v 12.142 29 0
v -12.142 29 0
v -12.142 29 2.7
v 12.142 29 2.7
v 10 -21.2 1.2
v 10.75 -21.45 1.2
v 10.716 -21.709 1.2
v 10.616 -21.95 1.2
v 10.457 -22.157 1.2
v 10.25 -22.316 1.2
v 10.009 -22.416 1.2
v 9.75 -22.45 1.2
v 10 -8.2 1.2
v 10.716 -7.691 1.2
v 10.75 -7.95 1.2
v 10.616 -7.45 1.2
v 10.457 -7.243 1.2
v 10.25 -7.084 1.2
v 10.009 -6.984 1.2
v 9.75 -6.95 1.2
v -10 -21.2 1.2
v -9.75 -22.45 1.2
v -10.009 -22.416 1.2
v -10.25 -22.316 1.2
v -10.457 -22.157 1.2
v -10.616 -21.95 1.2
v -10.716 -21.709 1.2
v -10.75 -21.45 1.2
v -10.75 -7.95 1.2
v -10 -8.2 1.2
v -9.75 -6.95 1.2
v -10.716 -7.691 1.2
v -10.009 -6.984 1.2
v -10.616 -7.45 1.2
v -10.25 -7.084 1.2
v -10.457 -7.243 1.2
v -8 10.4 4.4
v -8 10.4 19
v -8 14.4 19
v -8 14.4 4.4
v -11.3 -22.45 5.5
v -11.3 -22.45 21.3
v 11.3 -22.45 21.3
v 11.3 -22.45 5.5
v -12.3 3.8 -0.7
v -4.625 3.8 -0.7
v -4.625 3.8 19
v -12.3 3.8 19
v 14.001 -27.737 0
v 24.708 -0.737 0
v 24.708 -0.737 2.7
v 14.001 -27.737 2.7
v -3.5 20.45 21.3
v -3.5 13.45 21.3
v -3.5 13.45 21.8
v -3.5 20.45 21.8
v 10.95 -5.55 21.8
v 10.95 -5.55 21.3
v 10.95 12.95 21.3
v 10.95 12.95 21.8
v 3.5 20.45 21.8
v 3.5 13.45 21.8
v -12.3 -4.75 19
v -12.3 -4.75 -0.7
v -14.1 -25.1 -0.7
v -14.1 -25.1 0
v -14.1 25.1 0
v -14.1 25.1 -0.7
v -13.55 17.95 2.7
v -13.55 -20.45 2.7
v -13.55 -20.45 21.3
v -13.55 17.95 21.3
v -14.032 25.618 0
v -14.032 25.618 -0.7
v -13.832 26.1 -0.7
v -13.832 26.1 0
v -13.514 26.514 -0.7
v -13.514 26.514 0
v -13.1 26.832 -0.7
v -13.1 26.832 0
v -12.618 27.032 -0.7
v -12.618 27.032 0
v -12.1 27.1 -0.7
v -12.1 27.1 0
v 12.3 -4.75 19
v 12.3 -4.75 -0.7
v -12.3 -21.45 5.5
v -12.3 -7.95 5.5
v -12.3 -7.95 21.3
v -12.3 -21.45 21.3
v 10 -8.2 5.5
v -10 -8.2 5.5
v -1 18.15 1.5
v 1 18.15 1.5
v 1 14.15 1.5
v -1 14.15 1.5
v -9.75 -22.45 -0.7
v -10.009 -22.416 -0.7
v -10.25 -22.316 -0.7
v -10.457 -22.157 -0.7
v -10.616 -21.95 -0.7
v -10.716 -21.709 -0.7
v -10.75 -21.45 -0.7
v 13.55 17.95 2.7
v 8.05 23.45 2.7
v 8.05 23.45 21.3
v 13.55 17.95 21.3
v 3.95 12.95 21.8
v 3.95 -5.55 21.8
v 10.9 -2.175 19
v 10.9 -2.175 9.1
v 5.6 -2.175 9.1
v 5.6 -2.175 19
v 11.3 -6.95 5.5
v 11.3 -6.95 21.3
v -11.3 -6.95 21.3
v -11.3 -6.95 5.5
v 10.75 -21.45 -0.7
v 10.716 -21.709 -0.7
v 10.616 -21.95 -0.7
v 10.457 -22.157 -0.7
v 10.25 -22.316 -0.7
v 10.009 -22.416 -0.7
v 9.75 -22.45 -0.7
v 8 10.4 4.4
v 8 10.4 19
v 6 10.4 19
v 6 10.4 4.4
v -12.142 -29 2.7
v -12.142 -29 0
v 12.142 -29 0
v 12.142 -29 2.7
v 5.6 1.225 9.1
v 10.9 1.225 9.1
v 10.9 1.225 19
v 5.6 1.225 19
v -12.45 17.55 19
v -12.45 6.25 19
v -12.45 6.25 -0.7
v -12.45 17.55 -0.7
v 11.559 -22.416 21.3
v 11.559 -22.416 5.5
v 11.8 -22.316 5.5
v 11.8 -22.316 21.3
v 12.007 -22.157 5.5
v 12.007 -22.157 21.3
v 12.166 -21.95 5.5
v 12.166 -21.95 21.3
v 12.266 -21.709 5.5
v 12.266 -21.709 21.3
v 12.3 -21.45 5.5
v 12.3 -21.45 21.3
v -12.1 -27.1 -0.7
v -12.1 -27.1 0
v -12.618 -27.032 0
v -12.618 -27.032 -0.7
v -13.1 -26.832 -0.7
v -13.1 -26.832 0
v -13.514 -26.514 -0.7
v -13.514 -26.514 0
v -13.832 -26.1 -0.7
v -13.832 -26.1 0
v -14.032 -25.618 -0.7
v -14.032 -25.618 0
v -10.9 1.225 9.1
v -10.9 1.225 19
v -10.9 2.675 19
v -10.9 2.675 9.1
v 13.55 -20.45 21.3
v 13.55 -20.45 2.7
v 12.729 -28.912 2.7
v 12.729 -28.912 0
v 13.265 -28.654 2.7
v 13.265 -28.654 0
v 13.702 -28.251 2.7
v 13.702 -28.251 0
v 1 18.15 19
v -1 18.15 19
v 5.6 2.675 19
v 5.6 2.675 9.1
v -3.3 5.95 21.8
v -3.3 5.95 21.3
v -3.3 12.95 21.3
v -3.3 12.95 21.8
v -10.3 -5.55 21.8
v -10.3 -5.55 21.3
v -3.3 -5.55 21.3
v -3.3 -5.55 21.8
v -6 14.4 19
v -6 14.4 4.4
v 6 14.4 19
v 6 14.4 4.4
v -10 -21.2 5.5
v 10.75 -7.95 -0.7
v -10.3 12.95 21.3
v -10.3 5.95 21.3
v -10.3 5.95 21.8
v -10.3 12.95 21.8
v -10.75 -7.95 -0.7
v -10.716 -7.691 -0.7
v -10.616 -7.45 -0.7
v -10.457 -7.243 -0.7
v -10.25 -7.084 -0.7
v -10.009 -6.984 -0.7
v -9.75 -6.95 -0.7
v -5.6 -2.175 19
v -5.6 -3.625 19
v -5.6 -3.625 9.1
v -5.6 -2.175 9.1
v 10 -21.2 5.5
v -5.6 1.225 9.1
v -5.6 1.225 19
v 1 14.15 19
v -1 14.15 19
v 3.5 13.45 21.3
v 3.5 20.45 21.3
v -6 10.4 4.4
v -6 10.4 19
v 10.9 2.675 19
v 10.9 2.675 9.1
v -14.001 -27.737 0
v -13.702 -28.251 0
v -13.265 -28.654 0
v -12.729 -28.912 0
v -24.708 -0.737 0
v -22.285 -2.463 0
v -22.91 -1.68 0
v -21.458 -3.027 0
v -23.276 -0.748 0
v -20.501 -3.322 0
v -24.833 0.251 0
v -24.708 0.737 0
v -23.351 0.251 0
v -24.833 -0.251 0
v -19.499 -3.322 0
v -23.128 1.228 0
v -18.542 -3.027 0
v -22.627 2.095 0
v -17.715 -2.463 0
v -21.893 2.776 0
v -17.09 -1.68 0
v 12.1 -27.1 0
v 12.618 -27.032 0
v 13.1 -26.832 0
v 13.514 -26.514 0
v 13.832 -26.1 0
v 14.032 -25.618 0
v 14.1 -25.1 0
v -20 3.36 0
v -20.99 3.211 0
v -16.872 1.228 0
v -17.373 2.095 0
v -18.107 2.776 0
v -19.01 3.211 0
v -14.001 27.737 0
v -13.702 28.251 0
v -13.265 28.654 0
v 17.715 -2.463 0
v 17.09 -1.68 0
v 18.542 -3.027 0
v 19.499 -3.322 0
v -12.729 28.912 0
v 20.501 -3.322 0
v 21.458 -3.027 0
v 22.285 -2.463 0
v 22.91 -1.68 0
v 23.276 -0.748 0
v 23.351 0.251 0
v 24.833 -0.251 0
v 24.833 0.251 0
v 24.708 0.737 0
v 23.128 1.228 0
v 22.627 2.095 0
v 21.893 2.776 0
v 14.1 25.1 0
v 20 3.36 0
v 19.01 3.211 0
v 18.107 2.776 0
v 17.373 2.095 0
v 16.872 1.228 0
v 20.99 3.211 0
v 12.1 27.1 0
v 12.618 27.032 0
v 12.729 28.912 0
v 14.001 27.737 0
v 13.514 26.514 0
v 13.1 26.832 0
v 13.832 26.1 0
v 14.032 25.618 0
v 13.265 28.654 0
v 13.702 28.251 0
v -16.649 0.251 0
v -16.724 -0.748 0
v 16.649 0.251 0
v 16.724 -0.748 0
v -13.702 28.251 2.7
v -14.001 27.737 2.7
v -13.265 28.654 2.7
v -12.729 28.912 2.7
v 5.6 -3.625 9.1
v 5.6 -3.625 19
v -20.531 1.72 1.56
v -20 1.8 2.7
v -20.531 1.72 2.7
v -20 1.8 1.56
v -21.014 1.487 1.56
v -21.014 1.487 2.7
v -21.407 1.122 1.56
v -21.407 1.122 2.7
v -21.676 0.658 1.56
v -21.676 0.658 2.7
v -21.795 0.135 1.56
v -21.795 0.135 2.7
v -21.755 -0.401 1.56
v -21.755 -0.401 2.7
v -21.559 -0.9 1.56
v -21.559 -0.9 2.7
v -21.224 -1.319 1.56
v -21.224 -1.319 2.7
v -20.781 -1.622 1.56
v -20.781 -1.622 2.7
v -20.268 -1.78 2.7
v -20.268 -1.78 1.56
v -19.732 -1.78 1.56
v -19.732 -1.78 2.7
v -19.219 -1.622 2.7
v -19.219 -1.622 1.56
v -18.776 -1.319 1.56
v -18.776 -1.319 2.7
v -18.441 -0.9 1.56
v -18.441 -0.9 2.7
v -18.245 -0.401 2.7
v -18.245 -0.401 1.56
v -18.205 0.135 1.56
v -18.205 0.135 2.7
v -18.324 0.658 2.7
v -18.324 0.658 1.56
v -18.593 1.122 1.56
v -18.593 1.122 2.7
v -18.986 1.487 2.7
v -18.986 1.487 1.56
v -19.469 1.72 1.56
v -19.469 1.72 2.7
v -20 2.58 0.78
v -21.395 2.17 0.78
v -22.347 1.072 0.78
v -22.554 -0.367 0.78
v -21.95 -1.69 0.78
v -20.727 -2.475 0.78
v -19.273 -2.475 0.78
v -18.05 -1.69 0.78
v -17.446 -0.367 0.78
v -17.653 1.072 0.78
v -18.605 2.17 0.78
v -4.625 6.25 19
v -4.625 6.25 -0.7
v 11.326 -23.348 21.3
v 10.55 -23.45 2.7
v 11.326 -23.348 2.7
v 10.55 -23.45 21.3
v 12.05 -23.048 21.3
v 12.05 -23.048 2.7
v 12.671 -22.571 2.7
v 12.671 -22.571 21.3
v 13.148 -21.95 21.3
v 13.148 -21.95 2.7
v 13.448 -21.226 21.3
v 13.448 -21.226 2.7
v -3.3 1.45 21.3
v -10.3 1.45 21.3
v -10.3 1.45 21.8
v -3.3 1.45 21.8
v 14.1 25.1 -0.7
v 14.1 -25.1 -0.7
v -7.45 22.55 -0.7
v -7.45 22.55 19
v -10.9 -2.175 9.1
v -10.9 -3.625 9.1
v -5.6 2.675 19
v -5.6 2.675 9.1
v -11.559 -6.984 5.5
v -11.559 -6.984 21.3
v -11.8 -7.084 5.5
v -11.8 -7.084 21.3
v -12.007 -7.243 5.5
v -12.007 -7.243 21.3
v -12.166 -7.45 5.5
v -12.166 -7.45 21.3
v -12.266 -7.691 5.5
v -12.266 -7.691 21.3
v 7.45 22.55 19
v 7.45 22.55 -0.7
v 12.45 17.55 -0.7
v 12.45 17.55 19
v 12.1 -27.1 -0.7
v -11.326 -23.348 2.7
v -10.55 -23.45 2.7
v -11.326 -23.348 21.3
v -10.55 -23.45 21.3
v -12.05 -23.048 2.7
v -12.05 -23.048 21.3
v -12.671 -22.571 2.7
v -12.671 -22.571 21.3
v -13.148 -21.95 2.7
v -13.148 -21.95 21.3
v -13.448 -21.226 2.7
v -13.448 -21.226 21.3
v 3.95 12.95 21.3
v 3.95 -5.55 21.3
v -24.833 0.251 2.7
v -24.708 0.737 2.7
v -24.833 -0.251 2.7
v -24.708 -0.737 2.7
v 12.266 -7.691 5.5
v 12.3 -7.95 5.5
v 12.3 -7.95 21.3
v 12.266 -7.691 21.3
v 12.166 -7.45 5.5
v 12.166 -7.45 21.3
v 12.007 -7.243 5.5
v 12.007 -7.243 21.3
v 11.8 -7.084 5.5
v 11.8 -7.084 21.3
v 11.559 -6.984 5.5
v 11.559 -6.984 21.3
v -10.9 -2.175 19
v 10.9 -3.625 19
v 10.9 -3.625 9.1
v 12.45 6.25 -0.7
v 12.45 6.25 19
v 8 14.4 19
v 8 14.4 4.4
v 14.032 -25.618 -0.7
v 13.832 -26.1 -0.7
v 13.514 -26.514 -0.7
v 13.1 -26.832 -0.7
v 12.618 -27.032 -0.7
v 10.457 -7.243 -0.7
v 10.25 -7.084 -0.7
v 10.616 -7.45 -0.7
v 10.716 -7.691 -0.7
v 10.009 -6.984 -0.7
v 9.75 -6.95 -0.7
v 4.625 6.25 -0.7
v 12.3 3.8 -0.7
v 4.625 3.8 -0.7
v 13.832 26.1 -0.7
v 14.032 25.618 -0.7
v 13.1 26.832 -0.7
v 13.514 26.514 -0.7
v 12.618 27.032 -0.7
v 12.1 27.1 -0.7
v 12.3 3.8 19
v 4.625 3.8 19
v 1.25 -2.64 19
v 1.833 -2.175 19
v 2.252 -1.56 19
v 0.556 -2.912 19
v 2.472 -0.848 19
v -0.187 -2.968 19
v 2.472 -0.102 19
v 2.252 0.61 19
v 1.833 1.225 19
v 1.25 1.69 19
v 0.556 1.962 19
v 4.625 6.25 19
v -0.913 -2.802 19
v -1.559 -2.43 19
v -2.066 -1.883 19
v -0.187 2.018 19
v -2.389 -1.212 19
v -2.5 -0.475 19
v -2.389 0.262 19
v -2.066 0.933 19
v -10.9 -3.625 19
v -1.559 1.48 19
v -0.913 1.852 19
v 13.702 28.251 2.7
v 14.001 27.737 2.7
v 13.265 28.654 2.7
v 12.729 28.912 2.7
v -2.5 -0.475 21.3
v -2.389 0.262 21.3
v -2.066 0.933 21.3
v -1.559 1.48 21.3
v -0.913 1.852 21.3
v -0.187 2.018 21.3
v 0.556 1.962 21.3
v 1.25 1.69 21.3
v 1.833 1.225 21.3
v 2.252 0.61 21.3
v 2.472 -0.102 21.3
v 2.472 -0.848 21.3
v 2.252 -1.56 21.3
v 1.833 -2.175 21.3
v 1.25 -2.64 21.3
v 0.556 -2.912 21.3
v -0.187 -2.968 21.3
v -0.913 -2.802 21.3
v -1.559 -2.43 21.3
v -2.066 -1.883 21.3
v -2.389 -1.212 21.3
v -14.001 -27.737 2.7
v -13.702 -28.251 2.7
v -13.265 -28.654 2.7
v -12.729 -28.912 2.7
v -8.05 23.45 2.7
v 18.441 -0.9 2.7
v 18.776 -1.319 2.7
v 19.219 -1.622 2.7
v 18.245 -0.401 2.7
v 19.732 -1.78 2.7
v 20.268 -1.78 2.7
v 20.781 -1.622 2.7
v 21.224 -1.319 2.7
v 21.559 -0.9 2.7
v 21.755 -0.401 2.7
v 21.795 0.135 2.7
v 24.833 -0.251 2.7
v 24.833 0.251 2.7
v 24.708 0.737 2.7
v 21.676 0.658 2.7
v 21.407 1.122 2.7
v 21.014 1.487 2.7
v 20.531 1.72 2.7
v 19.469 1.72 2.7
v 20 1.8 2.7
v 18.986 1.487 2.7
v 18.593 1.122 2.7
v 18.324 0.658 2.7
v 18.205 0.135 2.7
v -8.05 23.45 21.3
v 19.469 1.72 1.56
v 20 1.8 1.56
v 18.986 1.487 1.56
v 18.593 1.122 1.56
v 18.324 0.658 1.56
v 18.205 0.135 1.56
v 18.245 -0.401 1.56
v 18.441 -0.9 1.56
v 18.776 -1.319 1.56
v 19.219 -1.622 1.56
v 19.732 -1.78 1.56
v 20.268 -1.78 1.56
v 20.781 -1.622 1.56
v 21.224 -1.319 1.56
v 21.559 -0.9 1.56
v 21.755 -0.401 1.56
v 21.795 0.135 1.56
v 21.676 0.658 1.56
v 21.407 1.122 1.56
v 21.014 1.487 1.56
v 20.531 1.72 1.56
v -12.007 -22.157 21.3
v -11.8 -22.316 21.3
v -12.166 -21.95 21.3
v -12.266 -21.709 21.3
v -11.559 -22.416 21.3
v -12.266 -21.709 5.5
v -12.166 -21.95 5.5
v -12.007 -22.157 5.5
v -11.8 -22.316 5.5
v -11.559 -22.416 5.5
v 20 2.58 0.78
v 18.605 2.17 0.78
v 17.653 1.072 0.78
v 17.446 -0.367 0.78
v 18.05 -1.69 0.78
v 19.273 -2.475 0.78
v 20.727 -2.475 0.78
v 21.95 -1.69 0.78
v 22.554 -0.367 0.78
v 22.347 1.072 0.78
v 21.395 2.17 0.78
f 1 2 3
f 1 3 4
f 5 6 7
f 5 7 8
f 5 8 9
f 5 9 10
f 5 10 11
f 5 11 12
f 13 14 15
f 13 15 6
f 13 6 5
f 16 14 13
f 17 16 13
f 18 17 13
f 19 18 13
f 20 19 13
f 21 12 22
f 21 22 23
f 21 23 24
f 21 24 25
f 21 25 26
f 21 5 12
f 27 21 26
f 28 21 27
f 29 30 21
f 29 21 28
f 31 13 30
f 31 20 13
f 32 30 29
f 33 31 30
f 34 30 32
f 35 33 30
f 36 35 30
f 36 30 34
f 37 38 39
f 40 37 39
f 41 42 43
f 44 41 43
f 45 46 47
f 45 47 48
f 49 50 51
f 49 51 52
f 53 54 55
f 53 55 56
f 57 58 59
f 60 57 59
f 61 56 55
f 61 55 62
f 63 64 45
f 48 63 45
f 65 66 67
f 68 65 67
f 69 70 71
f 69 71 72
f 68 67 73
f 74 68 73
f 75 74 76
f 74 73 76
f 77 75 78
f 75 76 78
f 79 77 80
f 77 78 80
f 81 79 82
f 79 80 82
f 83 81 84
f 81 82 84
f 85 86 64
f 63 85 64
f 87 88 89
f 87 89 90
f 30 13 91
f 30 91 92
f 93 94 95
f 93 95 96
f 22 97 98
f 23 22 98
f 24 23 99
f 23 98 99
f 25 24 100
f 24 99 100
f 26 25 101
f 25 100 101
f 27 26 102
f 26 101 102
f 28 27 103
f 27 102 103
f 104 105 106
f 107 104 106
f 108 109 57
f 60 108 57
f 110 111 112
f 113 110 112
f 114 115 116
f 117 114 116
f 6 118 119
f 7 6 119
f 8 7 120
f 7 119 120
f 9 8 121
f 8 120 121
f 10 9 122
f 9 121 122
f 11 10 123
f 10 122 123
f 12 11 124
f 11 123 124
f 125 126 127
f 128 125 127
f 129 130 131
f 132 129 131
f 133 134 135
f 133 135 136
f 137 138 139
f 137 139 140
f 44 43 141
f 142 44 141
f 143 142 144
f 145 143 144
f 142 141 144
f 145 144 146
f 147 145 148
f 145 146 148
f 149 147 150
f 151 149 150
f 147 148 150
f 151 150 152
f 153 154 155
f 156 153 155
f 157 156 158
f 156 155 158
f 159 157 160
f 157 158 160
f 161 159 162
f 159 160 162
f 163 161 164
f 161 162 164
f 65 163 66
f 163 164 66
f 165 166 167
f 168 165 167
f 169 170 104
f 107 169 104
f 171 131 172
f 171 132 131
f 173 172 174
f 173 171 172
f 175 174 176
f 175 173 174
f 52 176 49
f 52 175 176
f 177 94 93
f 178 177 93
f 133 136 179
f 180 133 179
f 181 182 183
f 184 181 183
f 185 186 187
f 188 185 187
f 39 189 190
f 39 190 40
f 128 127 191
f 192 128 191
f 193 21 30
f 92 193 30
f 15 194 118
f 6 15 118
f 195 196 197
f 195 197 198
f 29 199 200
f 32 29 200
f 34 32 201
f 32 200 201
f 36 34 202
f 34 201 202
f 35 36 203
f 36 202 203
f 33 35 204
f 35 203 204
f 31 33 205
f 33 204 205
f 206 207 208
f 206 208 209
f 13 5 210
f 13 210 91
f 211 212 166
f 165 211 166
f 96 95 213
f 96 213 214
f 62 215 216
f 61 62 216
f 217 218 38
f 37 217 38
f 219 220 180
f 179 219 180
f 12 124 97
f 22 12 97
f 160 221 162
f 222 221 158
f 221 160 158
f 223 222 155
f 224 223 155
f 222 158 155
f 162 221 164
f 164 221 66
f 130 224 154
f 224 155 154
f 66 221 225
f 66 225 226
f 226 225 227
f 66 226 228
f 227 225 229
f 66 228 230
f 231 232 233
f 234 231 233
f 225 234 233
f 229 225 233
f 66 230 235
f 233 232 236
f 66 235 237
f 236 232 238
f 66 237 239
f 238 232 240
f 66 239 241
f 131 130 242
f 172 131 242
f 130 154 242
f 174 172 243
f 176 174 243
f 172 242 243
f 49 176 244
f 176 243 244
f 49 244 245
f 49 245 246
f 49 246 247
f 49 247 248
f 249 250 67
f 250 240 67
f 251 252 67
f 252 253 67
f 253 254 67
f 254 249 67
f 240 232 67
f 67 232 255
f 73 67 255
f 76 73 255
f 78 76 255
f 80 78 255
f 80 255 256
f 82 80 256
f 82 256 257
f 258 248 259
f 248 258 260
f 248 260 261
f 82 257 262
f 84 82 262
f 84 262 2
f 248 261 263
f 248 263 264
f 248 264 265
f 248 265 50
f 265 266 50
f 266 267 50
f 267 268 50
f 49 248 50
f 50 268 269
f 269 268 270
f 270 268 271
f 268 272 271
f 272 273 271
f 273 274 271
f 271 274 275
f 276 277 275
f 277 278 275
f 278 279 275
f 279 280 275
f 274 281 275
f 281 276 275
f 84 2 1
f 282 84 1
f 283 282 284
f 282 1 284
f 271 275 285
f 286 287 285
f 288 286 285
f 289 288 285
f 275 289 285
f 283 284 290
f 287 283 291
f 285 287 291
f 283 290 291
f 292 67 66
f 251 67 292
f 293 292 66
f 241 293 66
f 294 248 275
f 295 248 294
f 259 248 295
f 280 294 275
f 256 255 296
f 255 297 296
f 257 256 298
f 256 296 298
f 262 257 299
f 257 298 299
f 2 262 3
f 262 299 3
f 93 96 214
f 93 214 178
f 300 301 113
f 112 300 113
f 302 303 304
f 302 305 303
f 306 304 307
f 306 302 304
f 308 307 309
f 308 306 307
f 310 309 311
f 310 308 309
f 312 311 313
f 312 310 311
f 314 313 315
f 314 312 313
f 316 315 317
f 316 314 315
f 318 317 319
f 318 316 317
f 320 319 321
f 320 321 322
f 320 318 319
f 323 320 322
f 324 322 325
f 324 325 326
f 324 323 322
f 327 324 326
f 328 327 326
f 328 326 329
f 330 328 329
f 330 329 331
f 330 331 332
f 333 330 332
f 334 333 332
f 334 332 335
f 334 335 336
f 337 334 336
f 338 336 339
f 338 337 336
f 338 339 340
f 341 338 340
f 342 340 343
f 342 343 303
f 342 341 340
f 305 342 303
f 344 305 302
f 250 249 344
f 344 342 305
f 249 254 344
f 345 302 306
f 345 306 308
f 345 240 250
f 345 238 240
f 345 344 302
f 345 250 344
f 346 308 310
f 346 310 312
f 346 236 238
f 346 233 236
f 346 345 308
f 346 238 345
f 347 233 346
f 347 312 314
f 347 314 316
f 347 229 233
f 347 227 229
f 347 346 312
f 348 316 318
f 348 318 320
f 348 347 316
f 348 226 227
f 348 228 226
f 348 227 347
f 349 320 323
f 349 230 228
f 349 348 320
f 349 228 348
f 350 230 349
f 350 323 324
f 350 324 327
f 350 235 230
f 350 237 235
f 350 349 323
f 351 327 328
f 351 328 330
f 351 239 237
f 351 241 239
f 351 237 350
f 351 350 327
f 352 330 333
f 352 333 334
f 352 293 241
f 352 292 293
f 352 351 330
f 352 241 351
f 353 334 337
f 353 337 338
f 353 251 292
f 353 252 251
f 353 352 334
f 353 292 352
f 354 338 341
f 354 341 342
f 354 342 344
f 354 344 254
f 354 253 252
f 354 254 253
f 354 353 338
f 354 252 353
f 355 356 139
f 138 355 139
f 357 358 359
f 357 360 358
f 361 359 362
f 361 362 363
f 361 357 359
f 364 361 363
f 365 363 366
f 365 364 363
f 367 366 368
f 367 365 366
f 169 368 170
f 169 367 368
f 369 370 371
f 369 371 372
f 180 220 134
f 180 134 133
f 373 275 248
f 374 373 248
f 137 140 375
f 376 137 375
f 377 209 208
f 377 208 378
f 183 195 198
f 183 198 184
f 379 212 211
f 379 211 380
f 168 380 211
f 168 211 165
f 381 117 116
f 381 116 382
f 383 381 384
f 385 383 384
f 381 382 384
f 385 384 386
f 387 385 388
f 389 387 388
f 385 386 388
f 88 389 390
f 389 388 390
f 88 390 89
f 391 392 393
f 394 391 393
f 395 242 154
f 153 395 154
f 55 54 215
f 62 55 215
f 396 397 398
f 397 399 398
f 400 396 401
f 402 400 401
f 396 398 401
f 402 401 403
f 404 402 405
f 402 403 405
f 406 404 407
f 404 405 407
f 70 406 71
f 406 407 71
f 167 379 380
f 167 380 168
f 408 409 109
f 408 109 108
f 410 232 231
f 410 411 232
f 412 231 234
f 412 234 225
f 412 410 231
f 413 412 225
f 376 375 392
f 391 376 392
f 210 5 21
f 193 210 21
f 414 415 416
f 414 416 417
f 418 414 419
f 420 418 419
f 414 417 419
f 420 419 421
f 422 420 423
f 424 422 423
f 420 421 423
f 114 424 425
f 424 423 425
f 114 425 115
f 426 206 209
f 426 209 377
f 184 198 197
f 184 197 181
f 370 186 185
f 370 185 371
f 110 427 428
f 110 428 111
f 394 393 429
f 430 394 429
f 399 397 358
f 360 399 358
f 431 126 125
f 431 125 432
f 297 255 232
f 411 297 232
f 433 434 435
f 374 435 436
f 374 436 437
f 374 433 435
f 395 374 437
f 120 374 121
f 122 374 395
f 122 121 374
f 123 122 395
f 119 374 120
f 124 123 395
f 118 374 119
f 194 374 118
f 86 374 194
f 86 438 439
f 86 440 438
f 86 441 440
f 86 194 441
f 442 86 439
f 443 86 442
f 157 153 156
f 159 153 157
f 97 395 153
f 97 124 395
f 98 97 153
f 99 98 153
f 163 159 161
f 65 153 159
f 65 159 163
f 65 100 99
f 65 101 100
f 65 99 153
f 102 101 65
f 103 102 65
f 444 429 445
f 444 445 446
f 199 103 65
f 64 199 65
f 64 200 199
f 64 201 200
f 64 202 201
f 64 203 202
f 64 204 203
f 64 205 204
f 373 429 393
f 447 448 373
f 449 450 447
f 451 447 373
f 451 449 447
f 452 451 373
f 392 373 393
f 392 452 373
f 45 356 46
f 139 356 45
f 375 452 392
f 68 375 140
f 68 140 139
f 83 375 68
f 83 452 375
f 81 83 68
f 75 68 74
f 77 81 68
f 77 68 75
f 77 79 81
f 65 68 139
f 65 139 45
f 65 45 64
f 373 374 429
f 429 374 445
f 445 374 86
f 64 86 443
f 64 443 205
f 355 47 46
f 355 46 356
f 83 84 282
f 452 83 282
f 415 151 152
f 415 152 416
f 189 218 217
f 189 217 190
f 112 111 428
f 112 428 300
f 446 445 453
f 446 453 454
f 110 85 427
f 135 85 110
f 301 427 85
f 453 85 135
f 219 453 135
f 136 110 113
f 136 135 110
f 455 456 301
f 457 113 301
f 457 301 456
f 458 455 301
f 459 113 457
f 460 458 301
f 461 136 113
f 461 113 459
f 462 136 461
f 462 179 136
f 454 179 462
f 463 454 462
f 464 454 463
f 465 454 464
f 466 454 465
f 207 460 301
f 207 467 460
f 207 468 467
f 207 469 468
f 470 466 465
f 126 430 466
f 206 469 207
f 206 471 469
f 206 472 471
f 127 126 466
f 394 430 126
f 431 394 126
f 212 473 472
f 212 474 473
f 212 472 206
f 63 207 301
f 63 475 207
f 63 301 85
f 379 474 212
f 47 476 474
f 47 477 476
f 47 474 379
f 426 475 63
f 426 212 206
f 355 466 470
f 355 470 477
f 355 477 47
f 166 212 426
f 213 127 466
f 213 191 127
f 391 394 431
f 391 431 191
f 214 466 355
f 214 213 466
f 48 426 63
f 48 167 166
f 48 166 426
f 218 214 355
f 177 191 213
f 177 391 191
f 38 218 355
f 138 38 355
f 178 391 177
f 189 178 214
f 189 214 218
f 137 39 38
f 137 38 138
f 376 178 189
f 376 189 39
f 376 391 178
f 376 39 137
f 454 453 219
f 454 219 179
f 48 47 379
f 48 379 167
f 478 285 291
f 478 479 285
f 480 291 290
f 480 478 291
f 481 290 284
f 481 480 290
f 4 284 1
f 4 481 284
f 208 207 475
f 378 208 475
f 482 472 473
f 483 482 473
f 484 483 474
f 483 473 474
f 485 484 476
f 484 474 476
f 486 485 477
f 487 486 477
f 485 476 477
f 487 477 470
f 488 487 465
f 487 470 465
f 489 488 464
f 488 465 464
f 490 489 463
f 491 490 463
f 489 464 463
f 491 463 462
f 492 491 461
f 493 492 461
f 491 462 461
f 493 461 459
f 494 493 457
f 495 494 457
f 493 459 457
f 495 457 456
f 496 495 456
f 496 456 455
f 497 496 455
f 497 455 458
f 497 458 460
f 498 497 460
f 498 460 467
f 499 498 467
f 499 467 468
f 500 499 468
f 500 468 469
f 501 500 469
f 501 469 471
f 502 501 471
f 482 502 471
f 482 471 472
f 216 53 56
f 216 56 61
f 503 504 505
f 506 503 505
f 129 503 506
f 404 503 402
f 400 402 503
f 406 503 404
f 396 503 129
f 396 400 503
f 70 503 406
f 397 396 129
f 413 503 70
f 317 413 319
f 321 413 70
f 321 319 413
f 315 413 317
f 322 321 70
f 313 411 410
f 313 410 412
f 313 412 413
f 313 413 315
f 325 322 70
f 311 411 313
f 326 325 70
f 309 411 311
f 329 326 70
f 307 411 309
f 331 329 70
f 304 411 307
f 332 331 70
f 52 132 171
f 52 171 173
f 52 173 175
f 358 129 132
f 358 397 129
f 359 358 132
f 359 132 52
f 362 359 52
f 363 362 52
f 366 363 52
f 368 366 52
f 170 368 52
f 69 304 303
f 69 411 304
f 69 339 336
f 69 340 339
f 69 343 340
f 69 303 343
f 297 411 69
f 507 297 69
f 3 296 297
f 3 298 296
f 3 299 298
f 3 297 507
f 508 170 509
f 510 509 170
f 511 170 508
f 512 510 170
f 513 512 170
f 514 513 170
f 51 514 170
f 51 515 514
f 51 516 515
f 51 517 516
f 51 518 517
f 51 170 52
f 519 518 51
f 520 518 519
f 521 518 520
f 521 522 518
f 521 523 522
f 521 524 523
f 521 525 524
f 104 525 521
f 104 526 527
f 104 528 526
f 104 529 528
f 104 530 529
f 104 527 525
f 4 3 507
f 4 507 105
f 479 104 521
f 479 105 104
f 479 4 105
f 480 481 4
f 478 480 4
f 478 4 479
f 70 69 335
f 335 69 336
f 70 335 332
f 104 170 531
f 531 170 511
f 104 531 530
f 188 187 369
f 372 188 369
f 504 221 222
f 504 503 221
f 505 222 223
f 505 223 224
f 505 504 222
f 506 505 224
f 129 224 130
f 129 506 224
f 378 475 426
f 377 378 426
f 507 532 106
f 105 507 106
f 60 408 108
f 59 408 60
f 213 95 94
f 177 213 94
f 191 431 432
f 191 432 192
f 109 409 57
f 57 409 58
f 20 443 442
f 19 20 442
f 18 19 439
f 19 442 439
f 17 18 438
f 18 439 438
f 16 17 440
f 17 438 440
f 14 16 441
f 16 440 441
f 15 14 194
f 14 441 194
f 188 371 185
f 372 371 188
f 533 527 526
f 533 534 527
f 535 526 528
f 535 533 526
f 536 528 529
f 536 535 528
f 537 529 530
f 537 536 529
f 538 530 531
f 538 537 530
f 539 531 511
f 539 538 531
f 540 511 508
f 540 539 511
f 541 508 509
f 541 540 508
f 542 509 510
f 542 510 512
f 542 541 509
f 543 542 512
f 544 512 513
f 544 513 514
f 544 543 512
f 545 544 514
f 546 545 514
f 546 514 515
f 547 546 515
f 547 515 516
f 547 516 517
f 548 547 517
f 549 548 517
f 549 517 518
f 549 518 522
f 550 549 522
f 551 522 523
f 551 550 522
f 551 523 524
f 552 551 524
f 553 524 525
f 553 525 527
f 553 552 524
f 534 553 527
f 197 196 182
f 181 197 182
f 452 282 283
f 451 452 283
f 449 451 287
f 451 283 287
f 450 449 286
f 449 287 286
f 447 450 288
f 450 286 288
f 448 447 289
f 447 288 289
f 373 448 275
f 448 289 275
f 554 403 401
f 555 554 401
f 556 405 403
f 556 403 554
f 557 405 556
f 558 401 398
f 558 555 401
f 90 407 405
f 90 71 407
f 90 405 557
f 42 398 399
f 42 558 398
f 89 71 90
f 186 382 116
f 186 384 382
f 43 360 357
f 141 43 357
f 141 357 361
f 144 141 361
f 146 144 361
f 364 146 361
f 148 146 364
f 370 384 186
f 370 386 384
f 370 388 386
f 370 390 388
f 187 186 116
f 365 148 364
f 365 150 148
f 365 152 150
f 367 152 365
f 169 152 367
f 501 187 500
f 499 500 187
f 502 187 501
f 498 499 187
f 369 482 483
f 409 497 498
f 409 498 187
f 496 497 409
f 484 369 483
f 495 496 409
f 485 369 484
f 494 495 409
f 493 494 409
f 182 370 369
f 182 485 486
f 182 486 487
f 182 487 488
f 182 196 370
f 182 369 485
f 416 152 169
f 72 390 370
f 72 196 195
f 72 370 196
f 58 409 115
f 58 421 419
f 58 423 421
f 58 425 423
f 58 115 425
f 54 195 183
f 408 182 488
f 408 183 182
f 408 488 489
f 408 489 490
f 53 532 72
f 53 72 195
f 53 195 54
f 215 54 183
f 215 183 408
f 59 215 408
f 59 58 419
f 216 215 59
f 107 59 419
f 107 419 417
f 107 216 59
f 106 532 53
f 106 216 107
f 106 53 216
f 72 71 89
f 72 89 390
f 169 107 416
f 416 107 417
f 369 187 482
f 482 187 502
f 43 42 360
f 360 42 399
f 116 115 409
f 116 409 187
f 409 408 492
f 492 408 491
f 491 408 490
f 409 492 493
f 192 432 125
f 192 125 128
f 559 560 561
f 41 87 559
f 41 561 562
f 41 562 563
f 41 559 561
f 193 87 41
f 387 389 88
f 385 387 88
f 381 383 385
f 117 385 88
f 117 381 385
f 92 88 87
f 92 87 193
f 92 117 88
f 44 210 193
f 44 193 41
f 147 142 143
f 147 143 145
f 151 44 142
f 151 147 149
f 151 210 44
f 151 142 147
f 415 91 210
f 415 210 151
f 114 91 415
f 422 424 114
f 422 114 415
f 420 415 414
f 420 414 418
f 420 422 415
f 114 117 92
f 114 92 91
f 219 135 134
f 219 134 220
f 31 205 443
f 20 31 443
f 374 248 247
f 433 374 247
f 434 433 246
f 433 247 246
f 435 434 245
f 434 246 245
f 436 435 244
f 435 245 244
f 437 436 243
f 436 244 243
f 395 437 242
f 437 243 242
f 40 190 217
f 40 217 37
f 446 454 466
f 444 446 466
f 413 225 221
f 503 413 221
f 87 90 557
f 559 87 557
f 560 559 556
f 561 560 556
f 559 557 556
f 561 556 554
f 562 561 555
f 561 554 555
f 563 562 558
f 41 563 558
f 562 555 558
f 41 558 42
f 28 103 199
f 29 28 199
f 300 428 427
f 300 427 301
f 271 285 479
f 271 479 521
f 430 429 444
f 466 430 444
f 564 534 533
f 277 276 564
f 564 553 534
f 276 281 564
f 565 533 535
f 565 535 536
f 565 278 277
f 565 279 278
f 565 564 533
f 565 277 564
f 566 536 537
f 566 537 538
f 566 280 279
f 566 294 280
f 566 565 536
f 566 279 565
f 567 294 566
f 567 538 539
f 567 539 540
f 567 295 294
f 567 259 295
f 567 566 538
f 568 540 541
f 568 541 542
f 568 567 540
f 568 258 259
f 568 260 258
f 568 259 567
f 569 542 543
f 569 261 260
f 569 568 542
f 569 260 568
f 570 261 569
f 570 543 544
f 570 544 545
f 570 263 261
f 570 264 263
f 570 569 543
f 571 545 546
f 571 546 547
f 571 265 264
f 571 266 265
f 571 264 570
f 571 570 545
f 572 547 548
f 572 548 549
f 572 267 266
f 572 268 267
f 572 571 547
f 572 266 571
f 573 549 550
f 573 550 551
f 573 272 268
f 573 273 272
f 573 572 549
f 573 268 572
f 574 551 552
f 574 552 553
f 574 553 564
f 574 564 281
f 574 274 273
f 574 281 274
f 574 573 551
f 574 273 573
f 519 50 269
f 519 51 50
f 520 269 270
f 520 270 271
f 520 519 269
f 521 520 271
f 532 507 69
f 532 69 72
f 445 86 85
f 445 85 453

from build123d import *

# Parameters (mm, degrees)
SKETCH1_W                    = 27
SKETCH1_H                    = 58
BOSS_EXTRUDE1_DEPTH          = 2.7
FILLET1_R                    = 2
BOSS_EXTRUDE2_DEPTH          = 0.7
SKETCH5_W                    = 27.1
SKETCH5_H                    = 46.9
BOSS_EXTRUDE3_DEPTH          = 18.6
FILLET2_R                    = 3
CHAMFER1_SIZE                = 5.5
CUT_EXTRUDE1_DEPTH           = 15.8
SKETCH7_W                    = 9.25
SKETCH7_H                    = 2.45
SKETCH7_W_2                  = 24.6
SKETCH7_H_2                  = 8.55
CUT_EXTRUDE2_DEPTH           = 19.7
SKETCH8_R                    = 2.5
CUT_EXTRUDE3_DEPTH           = 43.971353827
SKETCH9_W                    = 20
SKETCH9_H                    = 13
CUT_EXTRUDE4_DEPTH           = 45.073203307
CUT_EXTRUDE5_DEPTH           = 1.9
SKETCH11_W                   = 7
SKETCH11_H                   = 7
SKETCH11_H_2                 = 18.5
BOSS_EXTRUDE4_DEPTH          = 0.5
SKETCH12_W                   = 5.3
SKETCH12_H                   = 1.45
BOSS_EXTRUDE5_DEPTH          = 9.9
SKETCH12_3_W                 = 2
SKETCH12_3_H                 = 4
BOSS_EXTRUDE6_DEPTH          = 14.6
SKETCH12_4_W                 = 2
SKETCH12_4_H                 = 4
BOSS_EXTRUDE7_DEPTH          = 17.5
CSK_FOR_M3_SFHCS1_AT_2_COUNT = 2
CSK_FOR_M3_SFHCS1_AT_2_PITCH = 40


with BuildPart() as part:
    # Sketch1 → Boss-Extrude1 (new body)
    with BuildSketch(Plane.XY):
        Polygon((-13.5, 29), (-25, 0), (-13.5, -29), align=None)
        Rectangle(SKETCH1_W, SKETCH1_H)
        Polygon((13.5, 29), (25, 0), (13.5, -29), align=None)
    extrude(amount=BOSS_EXTRUDE1_DEPTH)

    # Fillet1
    fillet1_edges = [part.edges().sort_by_distance(p)[0] for p in [
        (-13.5, 29, 1.35),
        (13.5, 29, 1.35),
        (25, 0, 1.35),
        (13.5, -29, 1.35),
        (-13.5, -29, 1.35),
        (-25, 0, 1.35),
    ]]
    fillet(fillet1_edges, radius=FILLET1_R)

    # Sketch2 → Boss-Extrude2 (add)
    with BuildSketch(Plane(origin=(0, 0, 0), x_dir=(-1, 0, 0), z_dir=(0, 0, -1))):
        with BuildLine():
            Line((-12.1, -27.1), (12.1, -27.1))
            ThreePointArc((12.1, -27.1), (13.514213562, -26.514213562), (14.1, -25.1))
            Line((14.1, -25.1), (14.1, 25.1))
            ThreePointArc((14.1, 25.1), (13.514213562, 26.514213562), (12.1, 27.1))
            Line((12.1, 27.1), (-12.1, 27.1))
            ThreePointArc((-12.1, 27.1), (-13.514213562, 26.514213562), (-14.1, 25.1))
            Line((-14.1, 25.1), (-14.1, -25.1))
            ThreePointArc((-14.1, -25.1), (-13.514213562, -26.514213562), (-12.1, -27.1))
        make_face()
    extrude(amount=BOSS_EXTRUDE2_DEPTH)

    # Sketch5 → Boss-Extrude3 (add)
    with BuildSketch(Plane.XY.offset(2.7)):
        Rectangle(SKETCH5_W, SKETCH5_H)
    extrude(amount=BOSS_EXTRUDE3_DEPTH)

    # Fillet2
    fillet2_edges = [part.edges().sort_by_distance(p)[0] for p in [
        (13.55, -23.45, 12),
        (-13.55, -23.45, 12),
    ]]
    fillet(fillet2_edges, radius=FILLET2_R)

    # Chamfer1
    chamfer1_edges = [part.edges().sort_by_distance(p)[0] for p in [
        (13.55, 23.45, 12),
        (-13.55, 23.45, 12),
    ]]
    chamfer(chamfer1_edges, length=CHAMFER1_SIZE)

    # Sketch6 → Cut-Extrude1 (cut)
    with BuildSketch(Plane.XY.offset(21.3)):
        with BuildLine():
            Line((-11.3, -22.45), (11.3, -22.45))
            ThreePointArc((11.3, -22.45), (12.007106781, -22.157106781), (12.3, -21.45))
            Line((12.3, -21.45), (12.3, -7.95))
            ThreePointArc((12.3, -7.95), (12.007106781, -7.242893219), (11.3, -6.95))
            Line((11.3, -6.95), (-11.3, -6.95))
            ThreePointArc((-11.3, -6.95), (-12.007106781, -7.242893219), (-12.3, -7.95))
            Line((-12.3, -7.95), (-12.3, -21.45))
            ThreePointArc((-12.3, -21.45), (-12.007106781, -22.157106781), (-11.3, -22.45))
        make_face()
    extrude(amount=-CUT_EXTRUDE1_DEPTH, mode=Mode.SUBTRACT)

    # Sketch7 → Cut-Extrude2 (cut)
    with BuildSketch(Plane(origin=(0, 0, -0.7), x_dir=(-1, 0, 0), z_dir=(0, 0, -1))):
        Polygon((-12.45, 6.25), (12.45, 6.25), (12.45, 17.55), (7.45, 22.55), (-7.45, 22.55), (-12.45, 17.55), align=None)
        with Locations((0, 5.025)):
            Rectangle(SKETCH7_W, SKETCH7_H)
        with Locations((0, -0.475)):
            Rectangle(SKETCH7_W_2, SKETCH7_H_2)
    extrude(amount=-CUT_EXTRUDE2_DEPTH, mode=Mode.SUBTRACT)

    # Sketch8 → Cut-Extrude3 (cut, through all)
    with BuildSketch(Plane(origin=(0, 0, 19), x_dir=(-1, 0, 0), z_dir=(0, 0, -1))):
        with Locations((0, -0.475)):
            Circle(SKETCH8_R)
    extrude(amount=-CUT_EXTRUDE3_DEPTH, mode=Mode.SUBTRACT)

    # Sketch9 → Cut-Extrude4 (cut, through all)
    with BuildSketch(Plane(origin=(0, 0, -0.7), x_dir=(-1, 0, 0), z_dir=(0, 0, -1))):
        with Locations((0, -14.7)):
            Rectangle(SKETCH9_W, SKETCH9_H)
    extrude(amount=-CUT_EXTRUDE4_DEPTH, mode=Mode.SUBTRACT)

    # Sketch10 → Cut-Extrude5 (cut)
    with BuildSketch(Plane(origin=(0, 0, -0.7), x_dir=(-1, 0, 0), z_dir=(0, 0, -1))):
        with BuildLine():
            Line((-9.75, -22.45), (9.75, -22.45))
            ThreePointArc((9.75, -22.45), (10.457106781, -22.157106781), (10.75, -21.45))
            Line((10.75, -21.45), (10.75, -7.95))
            ThreePointArc((10.75, -7.95), (10.457106781, -7.242893219), (9.75, -6.95))
            Line((9.75, -6.95), (-9.75, -6.95))
            ThreePointArc((-9.75, -6.95), (-10.457106781, -7.242893219), (-10.75, -7.95))
            Line((-10.75, -7.95), (-10.75, -21.45))
            ThreePointArc((-10.75, -21.45), (-10.457106781, -22.157106781), (-9.75, -22.45))
        make_face()
    extrude(amount=-CUT_EXTRUDE5_DEPTH, mode=Mode.SUBTRACT)

    # Sketch11 → Boss-Extrude4 (add)
    with BuildSketch(Plane.XY.offset(21.3)):
        with Locations((0, 16.95)):
            Rectangle(SKETCH11_W, SKETCH11_H)
        with Locations((7.45, 3.7)):
            Rectangle(SKETCH11_W, SKETCH11_H_2)
        with Locations((-6.8, 9.45)):
            Rectangle(SKETCH11_W, SKETCH11_H)
        with Locations((-6.8, -2.05)):
            Rectangle(SKETCH11_W, SKETCH11_H)
    extrude(amount=BOSS_EXTRUDE4_DEPTH)

    # Sketch12 → Boss-Extrude5 (add)
    with BuildSketch(Plane(origin=(0, 0, 19), x_dir=(-1, 0, 0), z_dir=(0, 0, -1))):
        with Locations((-8.25, 1.95)):
            Rectangle(SKETCH12_W, SKETCH12_H)
        with Locations((-8.25, -2.9)):
            Rectangle(SKETCH12_W, SKETCH12_H)
        with Locations((8.25, 1.95)):
            Rectangle(SKETCH12_W, SKETCH12_H)
        with Locations((8.25, -2.9)):
            Rectangle(SKETCH12_W, SKETCH12_H)
    extrude(amount=BOSS_EXTRUDE5_DEPTH)

    # Sketch12<3> → Boss-Extrude6 (add)
    with BuildSketch(Plane(origin=(0, 0, 19), x_dir=(-1, 0, 0), z_dir=(0, 0, -1))):
        with Locations((-7, 12.4)):
            Rectangle(SKETCH12_3_W, SKETCH12_3_H)
        with Locations((7, 12.4)):
            Rectangle(SKETCH12_3_W, SKETCH12_3_H)
    extrude(amount=BOSS_EXTRUDE6_DEPTH)

    # Sketch12<4> → Boss-Extrude7 (add)
    with BuildSketch(Plane(origin=(0, 0, 19), x_dir=(-1, 0, 0), z_dir=(0, 0, -1))):
        with Locations((0, 16.15)):
            Rectangle(SKETCH12_4_W, SKETCH12_4_H)
    extrude(amount=BOSS_EXTRUDE7_DEPTH)

    # Sketch16 → CSK for M3 SFHCS1 (revolve, cut)
    with BuildSketch(Plane.YZ.offset(20)):
        Polygon((0, 0), (0, 2.7), (1.8, 2.7), (1.8, 1.56), (3.36, 0), align=None)
    csk_for_m3_sfhcs1 = revolve(axis=Axis((20, 0, -6.35), (0, 0, 1)), mode=Mode.SUBTRACT)

    # CSK for M3 SFHCS1 at 2: CSK for M3 SFHCS1 ×2
    with Locations(*[(-i * CSK_FOR_M3_SFHCS1_AT_2_PITCH, 0, 0) for i in range(1, CSK_FOR_M3_SFHCS1_AT_2_COUNT)]):
        add(csk_for_m3_sfhcs1, mode=Mode.SUBTRACT)


solid = part.part
